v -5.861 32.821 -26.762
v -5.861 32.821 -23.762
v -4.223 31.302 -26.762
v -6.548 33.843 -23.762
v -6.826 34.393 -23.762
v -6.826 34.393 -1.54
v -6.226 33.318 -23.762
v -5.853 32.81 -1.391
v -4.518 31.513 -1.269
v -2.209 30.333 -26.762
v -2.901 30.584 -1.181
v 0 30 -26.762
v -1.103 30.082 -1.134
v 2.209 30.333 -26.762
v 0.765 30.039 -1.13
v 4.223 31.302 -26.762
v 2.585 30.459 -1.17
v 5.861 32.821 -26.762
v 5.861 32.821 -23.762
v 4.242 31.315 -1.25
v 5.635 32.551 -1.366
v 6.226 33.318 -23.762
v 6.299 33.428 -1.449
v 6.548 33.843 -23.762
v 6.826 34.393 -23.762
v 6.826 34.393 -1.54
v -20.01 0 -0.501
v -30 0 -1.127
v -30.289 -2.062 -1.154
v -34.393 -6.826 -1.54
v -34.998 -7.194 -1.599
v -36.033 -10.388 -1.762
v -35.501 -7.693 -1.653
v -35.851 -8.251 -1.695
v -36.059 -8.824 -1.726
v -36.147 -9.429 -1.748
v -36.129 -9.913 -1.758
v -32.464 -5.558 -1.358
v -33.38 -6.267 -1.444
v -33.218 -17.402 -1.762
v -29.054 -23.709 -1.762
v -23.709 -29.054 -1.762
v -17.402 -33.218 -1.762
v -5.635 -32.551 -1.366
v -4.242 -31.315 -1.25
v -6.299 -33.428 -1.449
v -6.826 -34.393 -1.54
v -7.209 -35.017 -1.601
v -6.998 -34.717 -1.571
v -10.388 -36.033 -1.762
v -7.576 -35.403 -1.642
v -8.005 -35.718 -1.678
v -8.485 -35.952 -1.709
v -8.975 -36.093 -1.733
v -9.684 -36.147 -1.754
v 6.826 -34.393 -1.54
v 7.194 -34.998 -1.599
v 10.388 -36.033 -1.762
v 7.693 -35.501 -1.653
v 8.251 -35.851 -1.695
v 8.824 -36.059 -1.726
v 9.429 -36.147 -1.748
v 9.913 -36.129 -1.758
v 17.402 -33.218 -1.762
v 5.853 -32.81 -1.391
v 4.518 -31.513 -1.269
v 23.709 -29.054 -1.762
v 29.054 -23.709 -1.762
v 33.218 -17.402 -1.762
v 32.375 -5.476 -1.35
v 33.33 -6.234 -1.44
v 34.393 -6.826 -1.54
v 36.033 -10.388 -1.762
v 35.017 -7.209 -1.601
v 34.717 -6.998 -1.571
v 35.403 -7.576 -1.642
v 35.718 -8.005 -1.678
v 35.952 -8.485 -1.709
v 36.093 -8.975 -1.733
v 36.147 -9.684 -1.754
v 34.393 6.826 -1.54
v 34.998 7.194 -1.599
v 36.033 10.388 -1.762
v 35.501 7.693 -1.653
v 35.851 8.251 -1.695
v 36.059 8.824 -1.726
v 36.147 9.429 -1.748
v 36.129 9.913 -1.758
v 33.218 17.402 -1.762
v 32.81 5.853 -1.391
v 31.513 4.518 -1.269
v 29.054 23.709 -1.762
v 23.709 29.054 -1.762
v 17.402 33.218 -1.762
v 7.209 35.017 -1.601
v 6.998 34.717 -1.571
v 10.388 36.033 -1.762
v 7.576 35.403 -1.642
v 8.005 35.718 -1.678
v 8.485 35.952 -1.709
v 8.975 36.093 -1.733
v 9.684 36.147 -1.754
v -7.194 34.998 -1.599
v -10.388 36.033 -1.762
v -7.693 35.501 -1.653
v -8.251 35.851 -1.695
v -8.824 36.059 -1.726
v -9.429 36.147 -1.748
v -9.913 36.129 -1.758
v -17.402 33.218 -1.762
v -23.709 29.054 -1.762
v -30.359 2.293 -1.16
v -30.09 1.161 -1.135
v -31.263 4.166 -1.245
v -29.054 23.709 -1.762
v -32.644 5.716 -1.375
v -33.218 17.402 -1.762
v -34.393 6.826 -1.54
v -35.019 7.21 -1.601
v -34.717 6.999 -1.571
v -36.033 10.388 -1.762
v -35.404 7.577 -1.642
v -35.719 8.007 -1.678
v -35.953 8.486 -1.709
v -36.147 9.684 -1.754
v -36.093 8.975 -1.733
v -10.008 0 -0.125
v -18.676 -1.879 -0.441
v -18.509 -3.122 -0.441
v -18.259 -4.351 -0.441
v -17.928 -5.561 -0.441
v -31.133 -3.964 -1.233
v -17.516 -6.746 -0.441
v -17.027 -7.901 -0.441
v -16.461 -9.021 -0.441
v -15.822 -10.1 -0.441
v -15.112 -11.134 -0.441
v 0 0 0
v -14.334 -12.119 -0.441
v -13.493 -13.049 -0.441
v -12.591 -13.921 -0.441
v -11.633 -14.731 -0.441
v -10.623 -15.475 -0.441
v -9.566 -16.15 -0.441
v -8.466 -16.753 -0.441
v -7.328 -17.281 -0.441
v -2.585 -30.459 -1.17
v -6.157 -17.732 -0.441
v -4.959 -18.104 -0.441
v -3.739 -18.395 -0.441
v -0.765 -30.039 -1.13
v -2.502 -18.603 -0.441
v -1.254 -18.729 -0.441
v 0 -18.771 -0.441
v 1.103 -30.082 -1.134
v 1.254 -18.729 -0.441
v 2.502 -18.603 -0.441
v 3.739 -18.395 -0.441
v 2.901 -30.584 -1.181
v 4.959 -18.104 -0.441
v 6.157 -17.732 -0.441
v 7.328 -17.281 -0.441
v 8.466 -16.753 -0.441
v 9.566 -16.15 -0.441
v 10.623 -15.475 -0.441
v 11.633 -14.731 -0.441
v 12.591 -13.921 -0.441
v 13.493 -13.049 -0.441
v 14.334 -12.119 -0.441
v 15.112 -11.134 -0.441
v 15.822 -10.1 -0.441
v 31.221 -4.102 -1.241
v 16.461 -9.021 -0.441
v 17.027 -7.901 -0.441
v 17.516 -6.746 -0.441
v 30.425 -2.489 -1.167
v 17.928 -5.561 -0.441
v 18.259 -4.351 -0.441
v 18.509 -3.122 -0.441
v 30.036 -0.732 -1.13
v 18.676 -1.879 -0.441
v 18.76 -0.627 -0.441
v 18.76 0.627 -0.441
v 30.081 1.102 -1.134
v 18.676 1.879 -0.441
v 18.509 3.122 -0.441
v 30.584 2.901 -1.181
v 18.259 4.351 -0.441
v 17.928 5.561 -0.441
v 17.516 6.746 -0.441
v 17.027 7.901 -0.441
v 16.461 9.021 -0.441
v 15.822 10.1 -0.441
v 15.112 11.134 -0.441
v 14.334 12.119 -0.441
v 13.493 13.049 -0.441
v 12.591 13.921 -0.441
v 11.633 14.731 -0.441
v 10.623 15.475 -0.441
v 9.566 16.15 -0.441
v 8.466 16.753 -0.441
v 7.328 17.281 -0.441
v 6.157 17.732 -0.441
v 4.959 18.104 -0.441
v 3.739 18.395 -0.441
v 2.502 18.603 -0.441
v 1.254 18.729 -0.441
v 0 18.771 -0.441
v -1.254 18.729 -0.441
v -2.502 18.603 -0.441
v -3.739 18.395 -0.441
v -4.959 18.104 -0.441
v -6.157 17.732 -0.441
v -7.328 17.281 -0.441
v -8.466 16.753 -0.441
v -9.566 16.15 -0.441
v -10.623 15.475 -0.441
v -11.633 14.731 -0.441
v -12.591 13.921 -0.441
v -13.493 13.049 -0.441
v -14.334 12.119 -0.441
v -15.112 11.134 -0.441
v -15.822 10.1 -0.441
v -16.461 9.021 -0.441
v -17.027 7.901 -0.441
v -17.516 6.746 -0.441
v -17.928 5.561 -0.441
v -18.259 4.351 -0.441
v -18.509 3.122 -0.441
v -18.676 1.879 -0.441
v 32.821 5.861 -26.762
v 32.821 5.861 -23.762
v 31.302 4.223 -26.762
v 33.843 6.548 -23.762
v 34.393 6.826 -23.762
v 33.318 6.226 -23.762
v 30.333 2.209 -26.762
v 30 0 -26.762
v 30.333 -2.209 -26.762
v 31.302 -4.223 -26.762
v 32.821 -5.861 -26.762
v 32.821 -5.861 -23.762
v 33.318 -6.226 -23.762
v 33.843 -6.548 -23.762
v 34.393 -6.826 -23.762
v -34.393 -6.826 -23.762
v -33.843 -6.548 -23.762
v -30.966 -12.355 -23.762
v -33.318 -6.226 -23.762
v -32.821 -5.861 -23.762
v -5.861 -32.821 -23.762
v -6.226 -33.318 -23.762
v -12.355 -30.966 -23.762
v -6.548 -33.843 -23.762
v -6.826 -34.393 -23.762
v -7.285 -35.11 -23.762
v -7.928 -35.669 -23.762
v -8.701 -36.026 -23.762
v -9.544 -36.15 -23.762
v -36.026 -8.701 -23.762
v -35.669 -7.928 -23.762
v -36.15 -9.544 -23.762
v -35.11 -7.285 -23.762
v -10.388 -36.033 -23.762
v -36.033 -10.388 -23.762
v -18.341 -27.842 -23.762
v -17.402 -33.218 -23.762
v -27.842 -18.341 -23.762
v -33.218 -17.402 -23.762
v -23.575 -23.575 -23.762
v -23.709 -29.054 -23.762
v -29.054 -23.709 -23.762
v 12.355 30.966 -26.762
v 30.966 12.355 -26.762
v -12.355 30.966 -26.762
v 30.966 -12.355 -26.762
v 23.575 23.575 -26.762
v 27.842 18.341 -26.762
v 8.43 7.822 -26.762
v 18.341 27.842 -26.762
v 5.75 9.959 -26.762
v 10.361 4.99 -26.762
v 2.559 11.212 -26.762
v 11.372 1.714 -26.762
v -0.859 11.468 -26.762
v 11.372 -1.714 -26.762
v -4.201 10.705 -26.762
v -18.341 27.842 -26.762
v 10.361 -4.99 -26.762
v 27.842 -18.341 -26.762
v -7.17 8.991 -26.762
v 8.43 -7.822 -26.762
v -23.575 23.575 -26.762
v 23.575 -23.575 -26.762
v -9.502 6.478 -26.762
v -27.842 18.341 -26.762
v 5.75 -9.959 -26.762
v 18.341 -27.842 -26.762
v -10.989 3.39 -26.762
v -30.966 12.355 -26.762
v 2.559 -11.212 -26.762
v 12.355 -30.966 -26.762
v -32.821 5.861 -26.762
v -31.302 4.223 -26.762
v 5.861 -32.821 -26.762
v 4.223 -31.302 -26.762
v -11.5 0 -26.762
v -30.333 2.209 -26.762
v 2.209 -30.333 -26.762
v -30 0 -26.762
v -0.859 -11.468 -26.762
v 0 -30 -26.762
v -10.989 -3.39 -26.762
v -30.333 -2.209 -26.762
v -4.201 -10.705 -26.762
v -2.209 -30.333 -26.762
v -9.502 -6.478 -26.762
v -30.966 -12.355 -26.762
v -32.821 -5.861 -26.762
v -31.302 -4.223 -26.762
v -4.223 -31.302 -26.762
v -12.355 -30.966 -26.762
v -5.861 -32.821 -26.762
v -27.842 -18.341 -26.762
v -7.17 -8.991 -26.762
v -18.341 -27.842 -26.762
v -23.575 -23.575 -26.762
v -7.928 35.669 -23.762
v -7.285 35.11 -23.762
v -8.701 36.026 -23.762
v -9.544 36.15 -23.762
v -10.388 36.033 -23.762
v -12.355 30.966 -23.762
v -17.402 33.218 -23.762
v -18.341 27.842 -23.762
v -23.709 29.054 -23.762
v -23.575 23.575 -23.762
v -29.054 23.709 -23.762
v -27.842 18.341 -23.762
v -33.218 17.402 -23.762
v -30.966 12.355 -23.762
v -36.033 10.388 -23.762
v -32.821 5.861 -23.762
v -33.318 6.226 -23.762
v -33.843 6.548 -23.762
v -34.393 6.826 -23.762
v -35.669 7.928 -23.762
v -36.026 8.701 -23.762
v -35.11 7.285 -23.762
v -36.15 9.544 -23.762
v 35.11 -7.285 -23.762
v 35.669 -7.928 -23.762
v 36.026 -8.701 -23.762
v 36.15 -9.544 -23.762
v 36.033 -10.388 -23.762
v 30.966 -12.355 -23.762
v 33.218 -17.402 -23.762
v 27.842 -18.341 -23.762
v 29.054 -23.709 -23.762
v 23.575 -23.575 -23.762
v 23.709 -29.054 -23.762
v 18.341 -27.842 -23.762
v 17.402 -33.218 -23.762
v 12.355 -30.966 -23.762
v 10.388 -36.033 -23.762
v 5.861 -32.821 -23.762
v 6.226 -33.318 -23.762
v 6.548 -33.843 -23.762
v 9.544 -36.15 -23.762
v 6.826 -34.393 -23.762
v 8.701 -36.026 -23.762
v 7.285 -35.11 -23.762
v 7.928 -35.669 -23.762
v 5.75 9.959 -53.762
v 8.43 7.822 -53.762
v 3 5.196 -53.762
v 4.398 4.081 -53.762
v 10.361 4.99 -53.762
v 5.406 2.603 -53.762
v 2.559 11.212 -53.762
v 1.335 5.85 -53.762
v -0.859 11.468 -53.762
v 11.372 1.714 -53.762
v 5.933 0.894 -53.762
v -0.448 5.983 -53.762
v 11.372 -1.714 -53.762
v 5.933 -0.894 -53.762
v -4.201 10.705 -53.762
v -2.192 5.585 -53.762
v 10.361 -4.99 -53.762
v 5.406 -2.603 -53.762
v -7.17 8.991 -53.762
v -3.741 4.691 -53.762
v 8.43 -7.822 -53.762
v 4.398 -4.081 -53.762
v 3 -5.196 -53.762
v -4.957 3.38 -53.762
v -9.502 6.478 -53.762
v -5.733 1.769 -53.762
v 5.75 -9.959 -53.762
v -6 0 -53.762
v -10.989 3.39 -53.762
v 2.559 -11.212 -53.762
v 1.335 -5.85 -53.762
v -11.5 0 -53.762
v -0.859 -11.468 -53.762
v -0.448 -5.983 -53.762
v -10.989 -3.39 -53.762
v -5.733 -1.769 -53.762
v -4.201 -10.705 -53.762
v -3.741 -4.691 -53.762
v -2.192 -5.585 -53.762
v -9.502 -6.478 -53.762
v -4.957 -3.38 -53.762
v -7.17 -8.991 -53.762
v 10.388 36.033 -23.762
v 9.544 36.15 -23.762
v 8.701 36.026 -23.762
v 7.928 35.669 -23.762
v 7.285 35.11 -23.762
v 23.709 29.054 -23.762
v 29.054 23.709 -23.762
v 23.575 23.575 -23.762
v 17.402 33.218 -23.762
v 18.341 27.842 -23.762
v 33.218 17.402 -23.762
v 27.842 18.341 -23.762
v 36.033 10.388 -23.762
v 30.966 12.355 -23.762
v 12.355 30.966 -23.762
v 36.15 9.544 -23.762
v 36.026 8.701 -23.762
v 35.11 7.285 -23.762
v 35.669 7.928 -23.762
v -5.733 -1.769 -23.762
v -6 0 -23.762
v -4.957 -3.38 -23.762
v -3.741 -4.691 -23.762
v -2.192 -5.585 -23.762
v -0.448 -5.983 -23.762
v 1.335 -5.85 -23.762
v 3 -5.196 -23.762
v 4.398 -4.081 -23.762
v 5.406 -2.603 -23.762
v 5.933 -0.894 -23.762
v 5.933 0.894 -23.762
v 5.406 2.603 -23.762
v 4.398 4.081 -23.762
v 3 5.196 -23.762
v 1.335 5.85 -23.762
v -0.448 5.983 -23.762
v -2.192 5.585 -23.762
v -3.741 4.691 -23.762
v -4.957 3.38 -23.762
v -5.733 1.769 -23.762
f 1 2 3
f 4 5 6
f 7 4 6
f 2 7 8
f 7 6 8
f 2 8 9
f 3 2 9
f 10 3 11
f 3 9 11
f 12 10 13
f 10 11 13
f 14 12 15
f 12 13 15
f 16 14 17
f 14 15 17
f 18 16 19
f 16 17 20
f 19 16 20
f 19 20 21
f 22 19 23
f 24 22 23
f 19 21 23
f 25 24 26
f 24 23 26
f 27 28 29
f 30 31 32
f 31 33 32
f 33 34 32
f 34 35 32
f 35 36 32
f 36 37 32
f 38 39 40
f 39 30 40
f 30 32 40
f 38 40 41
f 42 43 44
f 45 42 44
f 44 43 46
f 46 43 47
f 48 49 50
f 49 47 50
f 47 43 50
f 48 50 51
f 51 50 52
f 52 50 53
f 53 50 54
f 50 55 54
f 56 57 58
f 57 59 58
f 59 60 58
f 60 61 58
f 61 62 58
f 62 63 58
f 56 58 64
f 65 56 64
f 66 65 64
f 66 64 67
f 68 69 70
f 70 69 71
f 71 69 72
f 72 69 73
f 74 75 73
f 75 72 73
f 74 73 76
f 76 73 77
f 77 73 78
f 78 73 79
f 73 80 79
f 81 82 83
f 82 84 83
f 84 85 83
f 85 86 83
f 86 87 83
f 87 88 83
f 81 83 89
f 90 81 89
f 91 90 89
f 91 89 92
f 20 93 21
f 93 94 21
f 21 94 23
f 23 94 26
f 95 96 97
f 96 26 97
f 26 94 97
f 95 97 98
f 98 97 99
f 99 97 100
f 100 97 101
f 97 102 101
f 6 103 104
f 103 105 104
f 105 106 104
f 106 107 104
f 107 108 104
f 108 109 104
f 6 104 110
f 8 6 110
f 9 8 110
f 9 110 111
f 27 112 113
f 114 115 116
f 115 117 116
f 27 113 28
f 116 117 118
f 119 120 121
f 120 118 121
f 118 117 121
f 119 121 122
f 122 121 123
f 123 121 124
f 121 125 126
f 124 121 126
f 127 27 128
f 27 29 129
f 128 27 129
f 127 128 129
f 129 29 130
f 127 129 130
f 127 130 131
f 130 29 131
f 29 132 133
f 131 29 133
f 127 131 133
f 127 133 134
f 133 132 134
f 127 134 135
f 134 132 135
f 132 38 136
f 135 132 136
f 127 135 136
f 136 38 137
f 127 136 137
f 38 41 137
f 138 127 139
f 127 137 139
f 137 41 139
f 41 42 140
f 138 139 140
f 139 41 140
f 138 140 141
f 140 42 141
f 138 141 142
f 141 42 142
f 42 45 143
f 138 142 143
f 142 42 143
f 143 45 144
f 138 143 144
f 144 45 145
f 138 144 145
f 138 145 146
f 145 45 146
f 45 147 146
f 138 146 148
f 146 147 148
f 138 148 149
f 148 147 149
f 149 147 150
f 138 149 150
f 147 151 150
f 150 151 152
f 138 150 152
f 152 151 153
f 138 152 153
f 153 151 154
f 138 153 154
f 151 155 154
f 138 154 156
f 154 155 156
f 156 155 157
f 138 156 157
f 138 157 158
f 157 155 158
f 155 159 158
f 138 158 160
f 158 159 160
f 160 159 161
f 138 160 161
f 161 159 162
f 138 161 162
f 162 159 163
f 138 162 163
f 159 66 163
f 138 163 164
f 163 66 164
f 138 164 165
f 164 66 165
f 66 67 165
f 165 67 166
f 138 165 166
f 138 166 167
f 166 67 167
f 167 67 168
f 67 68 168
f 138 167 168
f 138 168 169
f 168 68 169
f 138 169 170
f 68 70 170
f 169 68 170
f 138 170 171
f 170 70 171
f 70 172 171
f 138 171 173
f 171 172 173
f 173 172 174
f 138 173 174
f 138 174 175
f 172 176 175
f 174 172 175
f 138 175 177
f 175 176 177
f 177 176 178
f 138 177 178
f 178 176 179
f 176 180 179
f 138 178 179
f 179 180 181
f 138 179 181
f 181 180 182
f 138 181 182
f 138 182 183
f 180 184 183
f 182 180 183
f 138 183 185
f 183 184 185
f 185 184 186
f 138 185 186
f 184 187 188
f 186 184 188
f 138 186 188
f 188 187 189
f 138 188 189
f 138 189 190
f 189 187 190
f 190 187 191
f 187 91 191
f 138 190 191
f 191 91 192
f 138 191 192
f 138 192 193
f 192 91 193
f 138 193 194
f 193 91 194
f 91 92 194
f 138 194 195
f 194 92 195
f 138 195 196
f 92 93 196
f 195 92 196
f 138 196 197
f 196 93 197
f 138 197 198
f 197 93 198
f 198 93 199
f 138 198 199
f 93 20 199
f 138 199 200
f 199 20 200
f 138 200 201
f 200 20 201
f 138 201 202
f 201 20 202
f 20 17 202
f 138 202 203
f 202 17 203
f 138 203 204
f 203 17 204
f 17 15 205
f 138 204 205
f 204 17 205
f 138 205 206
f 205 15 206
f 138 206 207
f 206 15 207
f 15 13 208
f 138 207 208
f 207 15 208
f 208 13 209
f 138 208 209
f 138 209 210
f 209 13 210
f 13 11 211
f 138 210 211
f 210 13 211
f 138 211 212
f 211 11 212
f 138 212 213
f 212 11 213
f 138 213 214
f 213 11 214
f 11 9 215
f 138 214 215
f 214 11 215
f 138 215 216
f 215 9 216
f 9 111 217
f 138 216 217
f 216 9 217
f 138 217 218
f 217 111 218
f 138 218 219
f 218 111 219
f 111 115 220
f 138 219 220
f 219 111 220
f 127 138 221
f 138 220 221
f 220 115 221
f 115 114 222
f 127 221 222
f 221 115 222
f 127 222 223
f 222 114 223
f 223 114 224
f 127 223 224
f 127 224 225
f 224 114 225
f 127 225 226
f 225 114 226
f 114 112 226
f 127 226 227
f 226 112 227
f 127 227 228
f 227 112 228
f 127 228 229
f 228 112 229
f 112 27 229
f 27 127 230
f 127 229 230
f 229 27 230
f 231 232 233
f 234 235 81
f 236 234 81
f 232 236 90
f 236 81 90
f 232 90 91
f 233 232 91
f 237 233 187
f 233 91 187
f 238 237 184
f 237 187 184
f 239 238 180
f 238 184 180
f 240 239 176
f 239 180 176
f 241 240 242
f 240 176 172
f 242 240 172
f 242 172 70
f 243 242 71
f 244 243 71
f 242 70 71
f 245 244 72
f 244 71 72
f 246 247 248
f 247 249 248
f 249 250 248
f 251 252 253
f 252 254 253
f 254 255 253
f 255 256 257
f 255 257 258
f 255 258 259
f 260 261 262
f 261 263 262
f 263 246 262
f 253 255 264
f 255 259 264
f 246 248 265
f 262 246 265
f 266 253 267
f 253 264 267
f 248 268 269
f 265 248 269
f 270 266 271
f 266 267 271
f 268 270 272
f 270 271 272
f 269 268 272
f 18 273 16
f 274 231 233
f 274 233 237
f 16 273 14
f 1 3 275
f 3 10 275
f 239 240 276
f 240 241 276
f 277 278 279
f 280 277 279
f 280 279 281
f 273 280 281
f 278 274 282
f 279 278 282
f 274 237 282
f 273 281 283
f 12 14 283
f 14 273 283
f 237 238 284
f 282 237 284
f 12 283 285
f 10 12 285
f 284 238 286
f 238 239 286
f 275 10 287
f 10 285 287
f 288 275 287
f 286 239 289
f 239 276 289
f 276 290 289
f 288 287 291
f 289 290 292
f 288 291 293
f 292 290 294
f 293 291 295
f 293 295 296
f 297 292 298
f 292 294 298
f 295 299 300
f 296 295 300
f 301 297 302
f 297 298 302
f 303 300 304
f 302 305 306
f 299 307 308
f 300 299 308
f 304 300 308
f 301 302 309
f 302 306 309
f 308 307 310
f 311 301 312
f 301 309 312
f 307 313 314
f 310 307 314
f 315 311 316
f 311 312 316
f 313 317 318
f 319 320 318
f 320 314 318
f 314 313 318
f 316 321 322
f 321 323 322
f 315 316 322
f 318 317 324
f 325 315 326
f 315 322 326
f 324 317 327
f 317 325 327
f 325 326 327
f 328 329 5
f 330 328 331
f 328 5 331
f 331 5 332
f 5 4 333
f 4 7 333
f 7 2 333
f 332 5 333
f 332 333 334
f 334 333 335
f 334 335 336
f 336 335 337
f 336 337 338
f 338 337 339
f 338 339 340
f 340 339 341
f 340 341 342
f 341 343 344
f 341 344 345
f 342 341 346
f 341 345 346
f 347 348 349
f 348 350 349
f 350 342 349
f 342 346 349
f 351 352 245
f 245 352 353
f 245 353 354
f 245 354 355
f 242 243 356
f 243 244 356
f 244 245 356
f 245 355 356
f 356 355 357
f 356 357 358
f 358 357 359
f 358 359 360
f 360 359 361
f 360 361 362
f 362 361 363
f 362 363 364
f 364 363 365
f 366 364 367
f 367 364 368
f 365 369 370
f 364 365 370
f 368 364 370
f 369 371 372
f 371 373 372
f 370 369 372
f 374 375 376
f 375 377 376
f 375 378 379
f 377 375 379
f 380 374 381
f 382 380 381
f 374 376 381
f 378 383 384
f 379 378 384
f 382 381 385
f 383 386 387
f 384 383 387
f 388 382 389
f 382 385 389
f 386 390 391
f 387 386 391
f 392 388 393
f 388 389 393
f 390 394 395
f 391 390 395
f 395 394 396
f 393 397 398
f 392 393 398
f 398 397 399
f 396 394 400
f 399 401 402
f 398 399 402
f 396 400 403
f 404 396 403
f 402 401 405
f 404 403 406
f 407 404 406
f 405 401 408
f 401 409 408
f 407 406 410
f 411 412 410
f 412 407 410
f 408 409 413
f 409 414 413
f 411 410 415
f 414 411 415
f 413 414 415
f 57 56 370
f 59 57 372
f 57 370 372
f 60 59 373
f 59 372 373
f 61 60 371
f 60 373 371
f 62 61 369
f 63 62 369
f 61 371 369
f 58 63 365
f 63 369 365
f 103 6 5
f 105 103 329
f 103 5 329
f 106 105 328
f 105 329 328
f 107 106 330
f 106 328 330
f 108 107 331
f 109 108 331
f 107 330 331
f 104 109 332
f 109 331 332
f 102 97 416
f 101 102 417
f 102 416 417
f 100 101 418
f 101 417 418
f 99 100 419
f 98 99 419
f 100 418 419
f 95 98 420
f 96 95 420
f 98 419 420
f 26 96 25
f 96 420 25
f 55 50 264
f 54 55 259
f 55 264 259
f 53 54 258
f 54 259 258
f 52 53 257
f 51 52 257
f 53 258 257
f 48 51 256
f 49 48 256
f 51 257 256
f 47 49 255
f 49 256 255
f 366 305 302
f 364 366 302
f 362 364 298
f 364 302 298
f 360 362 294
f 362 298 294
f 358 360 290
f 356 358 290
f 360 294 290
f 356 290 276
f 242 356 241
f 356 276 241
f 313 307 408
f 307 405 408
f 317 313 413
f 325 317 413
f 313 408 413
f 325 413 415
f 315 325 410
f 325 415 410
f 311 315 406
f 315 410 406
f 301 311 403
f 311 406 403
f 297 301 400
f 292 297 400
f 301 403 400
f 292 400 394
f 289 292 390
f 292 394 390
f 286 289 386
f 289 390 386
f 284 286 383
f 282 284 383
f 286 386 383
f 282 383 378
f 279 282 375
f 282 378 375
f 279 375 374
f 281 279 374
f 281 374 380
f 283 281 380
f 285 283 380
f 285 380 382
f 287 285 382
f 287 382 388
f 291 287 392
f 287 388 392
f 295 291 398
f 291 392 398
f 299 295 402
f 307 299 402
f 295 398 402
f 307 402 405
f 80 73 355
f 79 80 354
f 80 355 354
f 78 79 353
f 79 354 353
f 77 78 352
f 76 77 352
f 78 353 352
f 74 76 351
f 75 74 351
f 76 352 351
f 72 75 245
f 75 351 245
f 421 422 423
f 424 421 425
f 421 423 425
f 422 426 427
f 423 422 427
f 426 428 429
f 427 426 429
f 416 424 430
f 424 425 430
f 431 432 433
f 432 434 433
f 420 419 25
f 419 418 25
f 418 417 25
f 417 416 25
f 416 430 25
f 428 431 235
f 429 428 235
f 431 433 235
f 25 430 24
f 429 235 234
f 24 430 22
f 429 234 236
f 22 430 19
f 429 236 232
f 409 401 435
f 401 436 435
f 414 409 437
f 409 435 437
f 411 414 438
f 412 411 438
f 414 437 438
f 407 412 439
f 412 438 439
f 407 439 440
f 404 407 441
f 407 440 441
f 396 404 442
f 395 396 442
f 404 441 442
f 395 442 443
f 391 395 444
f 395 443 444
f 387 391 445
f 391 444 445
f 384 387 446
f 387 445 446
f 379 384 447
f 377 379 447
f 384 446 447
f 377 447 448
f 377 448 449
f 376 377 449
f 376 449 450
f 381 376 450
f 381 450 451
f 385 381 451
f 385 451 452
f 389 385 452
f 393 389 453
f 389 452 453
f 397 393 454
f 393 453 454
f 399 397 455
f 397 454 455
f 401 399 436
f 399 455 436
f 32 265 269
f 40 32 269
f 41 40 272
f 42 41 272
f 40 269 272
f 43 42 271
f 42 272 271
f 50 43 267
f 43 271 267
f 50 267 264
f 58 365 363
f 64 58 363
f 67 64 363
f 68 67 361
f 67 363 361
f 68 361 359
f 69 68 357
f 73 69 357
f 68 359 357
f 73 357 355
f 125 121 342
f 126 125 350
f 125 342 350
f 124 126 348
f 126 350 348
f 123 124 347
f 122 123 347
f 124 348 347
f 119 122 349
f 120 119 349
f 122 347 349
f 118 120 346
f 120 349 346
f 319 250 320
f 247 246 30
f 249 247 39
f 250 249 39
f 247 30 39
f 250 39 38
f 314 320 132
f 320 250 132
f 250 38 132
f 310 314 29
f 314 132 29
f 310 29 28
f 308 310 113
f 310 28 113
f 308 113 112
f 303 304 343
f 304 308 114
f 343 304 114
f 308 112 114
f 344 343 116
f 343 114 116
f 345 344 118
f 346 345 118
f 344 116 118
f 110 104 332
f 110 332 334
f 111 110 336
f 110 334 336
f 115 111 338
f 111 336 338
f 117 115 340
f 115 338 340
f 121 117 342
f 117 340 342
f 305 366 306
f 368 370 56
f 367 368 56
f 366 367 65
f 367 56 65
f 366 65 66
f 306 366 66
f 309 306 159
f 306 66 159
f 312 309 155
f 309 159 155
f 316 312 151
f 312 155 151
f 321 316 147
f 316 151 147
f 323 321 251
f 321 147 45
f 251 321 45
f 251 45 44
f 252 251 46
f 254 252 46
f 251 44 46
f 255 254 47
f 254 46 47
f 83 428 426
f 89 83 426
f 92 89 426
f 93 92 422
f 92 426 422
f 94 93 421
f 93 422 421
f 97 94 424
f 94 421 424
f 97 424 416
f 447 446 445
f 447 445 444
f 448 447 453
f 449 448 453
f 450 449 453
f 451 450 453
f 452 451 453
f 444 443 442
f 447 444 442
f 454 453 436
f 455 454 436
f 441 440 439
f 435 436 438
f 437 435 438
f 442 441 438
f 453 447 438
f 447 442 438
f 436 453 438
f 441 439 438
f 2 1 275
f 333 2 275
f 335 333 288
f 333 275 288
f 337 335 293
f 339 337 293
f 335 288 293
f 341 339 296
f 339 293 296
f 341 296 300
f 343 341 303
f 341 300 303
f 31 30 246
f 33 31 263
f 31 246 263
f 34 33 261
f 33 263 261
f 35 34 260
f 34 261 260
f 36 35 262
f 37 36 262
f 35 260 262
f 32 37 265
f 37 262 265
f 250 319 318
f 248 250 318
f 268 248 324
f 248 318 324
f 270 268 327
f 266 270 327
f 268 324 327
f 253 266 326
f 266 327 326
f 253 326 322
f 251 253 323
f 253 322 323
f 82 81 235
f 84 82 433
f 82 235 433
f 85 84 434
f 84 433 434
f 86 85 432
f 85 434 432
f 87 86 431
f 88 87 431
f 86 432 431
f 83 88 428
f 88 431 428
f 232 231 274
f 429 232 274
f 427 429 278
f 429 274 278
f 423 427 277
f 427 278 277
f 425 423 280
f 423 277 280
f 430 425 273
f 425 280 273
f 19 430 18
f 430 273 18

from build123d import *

# Parameters (mm, degrees)
CUT_EXTRUDE1_REACH = 77.517
SKETCH2_R          = 7.5
FILLET1_R          = 3


with BuildPart() as part:
    # Sketch1 → Revolve1 (revolve)
    with BuildSketch(Plane(origin=(0, 0, 0), x_dir=(1, 0, 0), z_dir=(0, 1, 0))):
        with BuildLine():
            Line((0, 23.761691948), (0, 0))
            ThreePointArc((0, 0), (-18.770678987, 0.44066572), (-37.5, 1.761691948))
            Line((-37.5, 1.761691948), (-37.5, 23.761691948))
            Line((-37.5, 23.761691948), (-33.34, 23.761691948))
            Line((-33.34, 23.761691948), (-33.34, 26.761691948))
            Line((-33.34, 26.761691948), (-11.5, 26.761691948))
            Line((-11.5, 26.761691948), (-11.5, 53.761691948))
            Line((-11.5, 53.761691948), (-6, 53.761691948))
            Line((-6, 53.761691948), (-6, 23.761691948))
            Line((-6, 23.761691948), (0, 23.761691948))
        make_face()
    revolve(axis=Axis((0, 0, -358.843484937), (0, 0, 1)))

    # Sketch2 → Cut-Extrude1 (cut, up to next)
    with BuildSketch(Plane.XY, mode=Mode.PRIVATE) as cut_extrude1_sk1:
        with Locations((0, 37.5)):
            Circle(SKETCH2_R)
    cut_extrude1_tool1 = extrude(cut_extrude1_sk1.sketch, amount=-CUT_EXTRUDE1_REACH, mode=Mode.PRIVATE) & part.part
    # Sketch2 → Cut-Extrude1 (cut, up to next)
    with BuildSketch(Plane.XY, mode=Mode.PRIVATE) as cut_extrude1_sk2:
        with Locations((37.5, 0)):
            Circle(SKETCH2_R)
    cut_extrude1_tool2 = extrude(cut_extrude1_sk2.sketch, amount=-CUT_EXTRUDE1_REACH, mode=Mode.PRIVATE) & part.part
    # Sketch2 → Cut-Extrude1 (cut, up to next)
    with BuildSketch(Plane.XY, mode=Mode.PRIVATE) as cut_extrude1_sk3:
        with Locations((0, -37.5)):
            Circle(SKETCH2_R)
    cut_extrude1_tool3 = extrude(cut_extrude1_sk3.sketch, amount=-CUT_EXTRUDE1_REACH, mode=Mode.PRIVATE) & part.part
    # Sketch2 → Cut-Extrude1 (cut, up to next)
    with BuildSketch(Plane.XY, mode=Mode.PRIVATE) as cut_extrude1_sk4:
        with Locations((-37.5, 0)):
            Circle(SKETCH2_R)
    cut_extrude1_tool4 = extrude(cut_extrude1_sk4.sketch, amount=-CUT_EXTRUDE1_REACH, mode=Mode.PRIVATE) & part.part
    add(cut_extrude1_tool1.solids().sort_by_distance((0, 37.5, 0))[0], mode=Mode.SUBTRACT)
    add(cut_extrude1_tool2.solids().sort_by_distance((37.5, 0, 0))[0], mode=Mode.SUBTRACT)
    add(cut_extrude1_tool3.solids().sort_by_distance((0, -37.5, 0))[0], mode=Mode.SUBTRACT)
    add(cut_extrude1_tool4.solids().sort_by_distance((-37.5, 0, 0))[0], mode=Mode.SUBTRACT)

    # Fillet1
    # the kernel refuses this fillet: 3 mm, written as the material it takes off along each edge
    with BuildSketch(Plane(origin=(-36.75, -7.462405778, -31.291256689), x_dir=(0.9654419045574989, 0.26061835876313283, 0), z_dir=(0, 0, 1))) as fillet1_piece_1:
        with BuildLine():
            CenterArc((2.929820443, -2.959993207), FILLET1_R, 99.367586043, 81.606967112)
            ThreePointArc((-0.0697456, -3.01101823), (-0.065113873, -1.504808627), (0, 0))
            ThreePointArc((0, 0), (1.220758518, -0.100016984), (2.441517036, 0))
        make_face()
    extrude(amount=37.059130081, mode=Mode.SUBTRACT)
    with BuildSketch(Plane(origin=(-36.75, 7.462405778, -31.291256689), x_dir=(0.9654419045574933, -0.26061835876315326, 0), z_dir=(0, 0, 1))) as fillet1_piece_2:
        with BuildLine():
            CenterArc((2.929820443, 2.959993207), FILLET1_R, 179.025446846, 81.606967112)
            ThreePointArc((-0.0697456, 3.01101823), (-0.065113873, 1.504808627), (0, 0))
            ThreePointArc((0, 0), (1.220758518, 0.100016984), (2.441517036, 0))
        make_face()
    extrude(amount=37.059129481, mode=Mode.SUBTRACT)
    with BuildSketch(Plane(origin=(7.462405778, -36.75, -31.291256689), x_dir=(-0.26061835876313594, 0.9654419045574982, 0), z_dir=(0, 0, 1)), Plane(origin=(36.75, 7.462405778, -31.291256689), x_dir=(-0.9654419045574977, -0.2606183587631379, 0), z_dir=(0, 0, 1)), Plane(origin=(-7.462405778, 36.75, -31.291256689), x_dir=(0.2606183587631421, -0.9654419045574966, 0), z_dir=(0, 0, 1))) as fillet1_piece_3:
        with BuildLine():
            CenterArc((2.929820443, -2.959993207), FILLET1_R, 99.367586043, 81.606967112)
            ThreePointArc((-0.0697456, -3.01101823), (-0.065113873, -1.504808627), (0, 0))
            ThreePointArc((0, 0), (1.220758518, -0.100016984), (2.441517036, 0))
        make_face()
    extrude(amount=37.059129481, mode=Mode.SUBTRACT)
    with BuildSketch(Plane(origin=(-7.462405778, -36.75, -31.291256689), x_dir=(-0.9712182108388207, 0.238191492155031, 0), z_dir=(0, 0, 1)), Plane(origin=(36.75, -7.462405778, -31.291256689), x_dir=(-0.23819149215502627, -0.9712182108388219, 0), z_dir=(0, 0, 1)), Plane(origin=(7.462405778, 36.75, -31.291256689), x_dir=(0.9712182108388221, -0.2381914921550248, 0), z_dir=(0, 0, 1))) as fillet1_piece_4:
        with BuildLine():
            CenterArc((2.89135286, -2.997580065), FILLET1_R, 87.69851564, 81.606967112)
            ThreePointArc((-0.056538816, -2.440862306), (0.071720755, -1.222747271), (0, 0))
            ThreePointArc((0, 0), (1.505912948, 0.030249184), (3.011825896, 0))
        make_face()
    extrude(amount=37.059129481, mode=Mode.SUBTRACT)


solid = part.part
